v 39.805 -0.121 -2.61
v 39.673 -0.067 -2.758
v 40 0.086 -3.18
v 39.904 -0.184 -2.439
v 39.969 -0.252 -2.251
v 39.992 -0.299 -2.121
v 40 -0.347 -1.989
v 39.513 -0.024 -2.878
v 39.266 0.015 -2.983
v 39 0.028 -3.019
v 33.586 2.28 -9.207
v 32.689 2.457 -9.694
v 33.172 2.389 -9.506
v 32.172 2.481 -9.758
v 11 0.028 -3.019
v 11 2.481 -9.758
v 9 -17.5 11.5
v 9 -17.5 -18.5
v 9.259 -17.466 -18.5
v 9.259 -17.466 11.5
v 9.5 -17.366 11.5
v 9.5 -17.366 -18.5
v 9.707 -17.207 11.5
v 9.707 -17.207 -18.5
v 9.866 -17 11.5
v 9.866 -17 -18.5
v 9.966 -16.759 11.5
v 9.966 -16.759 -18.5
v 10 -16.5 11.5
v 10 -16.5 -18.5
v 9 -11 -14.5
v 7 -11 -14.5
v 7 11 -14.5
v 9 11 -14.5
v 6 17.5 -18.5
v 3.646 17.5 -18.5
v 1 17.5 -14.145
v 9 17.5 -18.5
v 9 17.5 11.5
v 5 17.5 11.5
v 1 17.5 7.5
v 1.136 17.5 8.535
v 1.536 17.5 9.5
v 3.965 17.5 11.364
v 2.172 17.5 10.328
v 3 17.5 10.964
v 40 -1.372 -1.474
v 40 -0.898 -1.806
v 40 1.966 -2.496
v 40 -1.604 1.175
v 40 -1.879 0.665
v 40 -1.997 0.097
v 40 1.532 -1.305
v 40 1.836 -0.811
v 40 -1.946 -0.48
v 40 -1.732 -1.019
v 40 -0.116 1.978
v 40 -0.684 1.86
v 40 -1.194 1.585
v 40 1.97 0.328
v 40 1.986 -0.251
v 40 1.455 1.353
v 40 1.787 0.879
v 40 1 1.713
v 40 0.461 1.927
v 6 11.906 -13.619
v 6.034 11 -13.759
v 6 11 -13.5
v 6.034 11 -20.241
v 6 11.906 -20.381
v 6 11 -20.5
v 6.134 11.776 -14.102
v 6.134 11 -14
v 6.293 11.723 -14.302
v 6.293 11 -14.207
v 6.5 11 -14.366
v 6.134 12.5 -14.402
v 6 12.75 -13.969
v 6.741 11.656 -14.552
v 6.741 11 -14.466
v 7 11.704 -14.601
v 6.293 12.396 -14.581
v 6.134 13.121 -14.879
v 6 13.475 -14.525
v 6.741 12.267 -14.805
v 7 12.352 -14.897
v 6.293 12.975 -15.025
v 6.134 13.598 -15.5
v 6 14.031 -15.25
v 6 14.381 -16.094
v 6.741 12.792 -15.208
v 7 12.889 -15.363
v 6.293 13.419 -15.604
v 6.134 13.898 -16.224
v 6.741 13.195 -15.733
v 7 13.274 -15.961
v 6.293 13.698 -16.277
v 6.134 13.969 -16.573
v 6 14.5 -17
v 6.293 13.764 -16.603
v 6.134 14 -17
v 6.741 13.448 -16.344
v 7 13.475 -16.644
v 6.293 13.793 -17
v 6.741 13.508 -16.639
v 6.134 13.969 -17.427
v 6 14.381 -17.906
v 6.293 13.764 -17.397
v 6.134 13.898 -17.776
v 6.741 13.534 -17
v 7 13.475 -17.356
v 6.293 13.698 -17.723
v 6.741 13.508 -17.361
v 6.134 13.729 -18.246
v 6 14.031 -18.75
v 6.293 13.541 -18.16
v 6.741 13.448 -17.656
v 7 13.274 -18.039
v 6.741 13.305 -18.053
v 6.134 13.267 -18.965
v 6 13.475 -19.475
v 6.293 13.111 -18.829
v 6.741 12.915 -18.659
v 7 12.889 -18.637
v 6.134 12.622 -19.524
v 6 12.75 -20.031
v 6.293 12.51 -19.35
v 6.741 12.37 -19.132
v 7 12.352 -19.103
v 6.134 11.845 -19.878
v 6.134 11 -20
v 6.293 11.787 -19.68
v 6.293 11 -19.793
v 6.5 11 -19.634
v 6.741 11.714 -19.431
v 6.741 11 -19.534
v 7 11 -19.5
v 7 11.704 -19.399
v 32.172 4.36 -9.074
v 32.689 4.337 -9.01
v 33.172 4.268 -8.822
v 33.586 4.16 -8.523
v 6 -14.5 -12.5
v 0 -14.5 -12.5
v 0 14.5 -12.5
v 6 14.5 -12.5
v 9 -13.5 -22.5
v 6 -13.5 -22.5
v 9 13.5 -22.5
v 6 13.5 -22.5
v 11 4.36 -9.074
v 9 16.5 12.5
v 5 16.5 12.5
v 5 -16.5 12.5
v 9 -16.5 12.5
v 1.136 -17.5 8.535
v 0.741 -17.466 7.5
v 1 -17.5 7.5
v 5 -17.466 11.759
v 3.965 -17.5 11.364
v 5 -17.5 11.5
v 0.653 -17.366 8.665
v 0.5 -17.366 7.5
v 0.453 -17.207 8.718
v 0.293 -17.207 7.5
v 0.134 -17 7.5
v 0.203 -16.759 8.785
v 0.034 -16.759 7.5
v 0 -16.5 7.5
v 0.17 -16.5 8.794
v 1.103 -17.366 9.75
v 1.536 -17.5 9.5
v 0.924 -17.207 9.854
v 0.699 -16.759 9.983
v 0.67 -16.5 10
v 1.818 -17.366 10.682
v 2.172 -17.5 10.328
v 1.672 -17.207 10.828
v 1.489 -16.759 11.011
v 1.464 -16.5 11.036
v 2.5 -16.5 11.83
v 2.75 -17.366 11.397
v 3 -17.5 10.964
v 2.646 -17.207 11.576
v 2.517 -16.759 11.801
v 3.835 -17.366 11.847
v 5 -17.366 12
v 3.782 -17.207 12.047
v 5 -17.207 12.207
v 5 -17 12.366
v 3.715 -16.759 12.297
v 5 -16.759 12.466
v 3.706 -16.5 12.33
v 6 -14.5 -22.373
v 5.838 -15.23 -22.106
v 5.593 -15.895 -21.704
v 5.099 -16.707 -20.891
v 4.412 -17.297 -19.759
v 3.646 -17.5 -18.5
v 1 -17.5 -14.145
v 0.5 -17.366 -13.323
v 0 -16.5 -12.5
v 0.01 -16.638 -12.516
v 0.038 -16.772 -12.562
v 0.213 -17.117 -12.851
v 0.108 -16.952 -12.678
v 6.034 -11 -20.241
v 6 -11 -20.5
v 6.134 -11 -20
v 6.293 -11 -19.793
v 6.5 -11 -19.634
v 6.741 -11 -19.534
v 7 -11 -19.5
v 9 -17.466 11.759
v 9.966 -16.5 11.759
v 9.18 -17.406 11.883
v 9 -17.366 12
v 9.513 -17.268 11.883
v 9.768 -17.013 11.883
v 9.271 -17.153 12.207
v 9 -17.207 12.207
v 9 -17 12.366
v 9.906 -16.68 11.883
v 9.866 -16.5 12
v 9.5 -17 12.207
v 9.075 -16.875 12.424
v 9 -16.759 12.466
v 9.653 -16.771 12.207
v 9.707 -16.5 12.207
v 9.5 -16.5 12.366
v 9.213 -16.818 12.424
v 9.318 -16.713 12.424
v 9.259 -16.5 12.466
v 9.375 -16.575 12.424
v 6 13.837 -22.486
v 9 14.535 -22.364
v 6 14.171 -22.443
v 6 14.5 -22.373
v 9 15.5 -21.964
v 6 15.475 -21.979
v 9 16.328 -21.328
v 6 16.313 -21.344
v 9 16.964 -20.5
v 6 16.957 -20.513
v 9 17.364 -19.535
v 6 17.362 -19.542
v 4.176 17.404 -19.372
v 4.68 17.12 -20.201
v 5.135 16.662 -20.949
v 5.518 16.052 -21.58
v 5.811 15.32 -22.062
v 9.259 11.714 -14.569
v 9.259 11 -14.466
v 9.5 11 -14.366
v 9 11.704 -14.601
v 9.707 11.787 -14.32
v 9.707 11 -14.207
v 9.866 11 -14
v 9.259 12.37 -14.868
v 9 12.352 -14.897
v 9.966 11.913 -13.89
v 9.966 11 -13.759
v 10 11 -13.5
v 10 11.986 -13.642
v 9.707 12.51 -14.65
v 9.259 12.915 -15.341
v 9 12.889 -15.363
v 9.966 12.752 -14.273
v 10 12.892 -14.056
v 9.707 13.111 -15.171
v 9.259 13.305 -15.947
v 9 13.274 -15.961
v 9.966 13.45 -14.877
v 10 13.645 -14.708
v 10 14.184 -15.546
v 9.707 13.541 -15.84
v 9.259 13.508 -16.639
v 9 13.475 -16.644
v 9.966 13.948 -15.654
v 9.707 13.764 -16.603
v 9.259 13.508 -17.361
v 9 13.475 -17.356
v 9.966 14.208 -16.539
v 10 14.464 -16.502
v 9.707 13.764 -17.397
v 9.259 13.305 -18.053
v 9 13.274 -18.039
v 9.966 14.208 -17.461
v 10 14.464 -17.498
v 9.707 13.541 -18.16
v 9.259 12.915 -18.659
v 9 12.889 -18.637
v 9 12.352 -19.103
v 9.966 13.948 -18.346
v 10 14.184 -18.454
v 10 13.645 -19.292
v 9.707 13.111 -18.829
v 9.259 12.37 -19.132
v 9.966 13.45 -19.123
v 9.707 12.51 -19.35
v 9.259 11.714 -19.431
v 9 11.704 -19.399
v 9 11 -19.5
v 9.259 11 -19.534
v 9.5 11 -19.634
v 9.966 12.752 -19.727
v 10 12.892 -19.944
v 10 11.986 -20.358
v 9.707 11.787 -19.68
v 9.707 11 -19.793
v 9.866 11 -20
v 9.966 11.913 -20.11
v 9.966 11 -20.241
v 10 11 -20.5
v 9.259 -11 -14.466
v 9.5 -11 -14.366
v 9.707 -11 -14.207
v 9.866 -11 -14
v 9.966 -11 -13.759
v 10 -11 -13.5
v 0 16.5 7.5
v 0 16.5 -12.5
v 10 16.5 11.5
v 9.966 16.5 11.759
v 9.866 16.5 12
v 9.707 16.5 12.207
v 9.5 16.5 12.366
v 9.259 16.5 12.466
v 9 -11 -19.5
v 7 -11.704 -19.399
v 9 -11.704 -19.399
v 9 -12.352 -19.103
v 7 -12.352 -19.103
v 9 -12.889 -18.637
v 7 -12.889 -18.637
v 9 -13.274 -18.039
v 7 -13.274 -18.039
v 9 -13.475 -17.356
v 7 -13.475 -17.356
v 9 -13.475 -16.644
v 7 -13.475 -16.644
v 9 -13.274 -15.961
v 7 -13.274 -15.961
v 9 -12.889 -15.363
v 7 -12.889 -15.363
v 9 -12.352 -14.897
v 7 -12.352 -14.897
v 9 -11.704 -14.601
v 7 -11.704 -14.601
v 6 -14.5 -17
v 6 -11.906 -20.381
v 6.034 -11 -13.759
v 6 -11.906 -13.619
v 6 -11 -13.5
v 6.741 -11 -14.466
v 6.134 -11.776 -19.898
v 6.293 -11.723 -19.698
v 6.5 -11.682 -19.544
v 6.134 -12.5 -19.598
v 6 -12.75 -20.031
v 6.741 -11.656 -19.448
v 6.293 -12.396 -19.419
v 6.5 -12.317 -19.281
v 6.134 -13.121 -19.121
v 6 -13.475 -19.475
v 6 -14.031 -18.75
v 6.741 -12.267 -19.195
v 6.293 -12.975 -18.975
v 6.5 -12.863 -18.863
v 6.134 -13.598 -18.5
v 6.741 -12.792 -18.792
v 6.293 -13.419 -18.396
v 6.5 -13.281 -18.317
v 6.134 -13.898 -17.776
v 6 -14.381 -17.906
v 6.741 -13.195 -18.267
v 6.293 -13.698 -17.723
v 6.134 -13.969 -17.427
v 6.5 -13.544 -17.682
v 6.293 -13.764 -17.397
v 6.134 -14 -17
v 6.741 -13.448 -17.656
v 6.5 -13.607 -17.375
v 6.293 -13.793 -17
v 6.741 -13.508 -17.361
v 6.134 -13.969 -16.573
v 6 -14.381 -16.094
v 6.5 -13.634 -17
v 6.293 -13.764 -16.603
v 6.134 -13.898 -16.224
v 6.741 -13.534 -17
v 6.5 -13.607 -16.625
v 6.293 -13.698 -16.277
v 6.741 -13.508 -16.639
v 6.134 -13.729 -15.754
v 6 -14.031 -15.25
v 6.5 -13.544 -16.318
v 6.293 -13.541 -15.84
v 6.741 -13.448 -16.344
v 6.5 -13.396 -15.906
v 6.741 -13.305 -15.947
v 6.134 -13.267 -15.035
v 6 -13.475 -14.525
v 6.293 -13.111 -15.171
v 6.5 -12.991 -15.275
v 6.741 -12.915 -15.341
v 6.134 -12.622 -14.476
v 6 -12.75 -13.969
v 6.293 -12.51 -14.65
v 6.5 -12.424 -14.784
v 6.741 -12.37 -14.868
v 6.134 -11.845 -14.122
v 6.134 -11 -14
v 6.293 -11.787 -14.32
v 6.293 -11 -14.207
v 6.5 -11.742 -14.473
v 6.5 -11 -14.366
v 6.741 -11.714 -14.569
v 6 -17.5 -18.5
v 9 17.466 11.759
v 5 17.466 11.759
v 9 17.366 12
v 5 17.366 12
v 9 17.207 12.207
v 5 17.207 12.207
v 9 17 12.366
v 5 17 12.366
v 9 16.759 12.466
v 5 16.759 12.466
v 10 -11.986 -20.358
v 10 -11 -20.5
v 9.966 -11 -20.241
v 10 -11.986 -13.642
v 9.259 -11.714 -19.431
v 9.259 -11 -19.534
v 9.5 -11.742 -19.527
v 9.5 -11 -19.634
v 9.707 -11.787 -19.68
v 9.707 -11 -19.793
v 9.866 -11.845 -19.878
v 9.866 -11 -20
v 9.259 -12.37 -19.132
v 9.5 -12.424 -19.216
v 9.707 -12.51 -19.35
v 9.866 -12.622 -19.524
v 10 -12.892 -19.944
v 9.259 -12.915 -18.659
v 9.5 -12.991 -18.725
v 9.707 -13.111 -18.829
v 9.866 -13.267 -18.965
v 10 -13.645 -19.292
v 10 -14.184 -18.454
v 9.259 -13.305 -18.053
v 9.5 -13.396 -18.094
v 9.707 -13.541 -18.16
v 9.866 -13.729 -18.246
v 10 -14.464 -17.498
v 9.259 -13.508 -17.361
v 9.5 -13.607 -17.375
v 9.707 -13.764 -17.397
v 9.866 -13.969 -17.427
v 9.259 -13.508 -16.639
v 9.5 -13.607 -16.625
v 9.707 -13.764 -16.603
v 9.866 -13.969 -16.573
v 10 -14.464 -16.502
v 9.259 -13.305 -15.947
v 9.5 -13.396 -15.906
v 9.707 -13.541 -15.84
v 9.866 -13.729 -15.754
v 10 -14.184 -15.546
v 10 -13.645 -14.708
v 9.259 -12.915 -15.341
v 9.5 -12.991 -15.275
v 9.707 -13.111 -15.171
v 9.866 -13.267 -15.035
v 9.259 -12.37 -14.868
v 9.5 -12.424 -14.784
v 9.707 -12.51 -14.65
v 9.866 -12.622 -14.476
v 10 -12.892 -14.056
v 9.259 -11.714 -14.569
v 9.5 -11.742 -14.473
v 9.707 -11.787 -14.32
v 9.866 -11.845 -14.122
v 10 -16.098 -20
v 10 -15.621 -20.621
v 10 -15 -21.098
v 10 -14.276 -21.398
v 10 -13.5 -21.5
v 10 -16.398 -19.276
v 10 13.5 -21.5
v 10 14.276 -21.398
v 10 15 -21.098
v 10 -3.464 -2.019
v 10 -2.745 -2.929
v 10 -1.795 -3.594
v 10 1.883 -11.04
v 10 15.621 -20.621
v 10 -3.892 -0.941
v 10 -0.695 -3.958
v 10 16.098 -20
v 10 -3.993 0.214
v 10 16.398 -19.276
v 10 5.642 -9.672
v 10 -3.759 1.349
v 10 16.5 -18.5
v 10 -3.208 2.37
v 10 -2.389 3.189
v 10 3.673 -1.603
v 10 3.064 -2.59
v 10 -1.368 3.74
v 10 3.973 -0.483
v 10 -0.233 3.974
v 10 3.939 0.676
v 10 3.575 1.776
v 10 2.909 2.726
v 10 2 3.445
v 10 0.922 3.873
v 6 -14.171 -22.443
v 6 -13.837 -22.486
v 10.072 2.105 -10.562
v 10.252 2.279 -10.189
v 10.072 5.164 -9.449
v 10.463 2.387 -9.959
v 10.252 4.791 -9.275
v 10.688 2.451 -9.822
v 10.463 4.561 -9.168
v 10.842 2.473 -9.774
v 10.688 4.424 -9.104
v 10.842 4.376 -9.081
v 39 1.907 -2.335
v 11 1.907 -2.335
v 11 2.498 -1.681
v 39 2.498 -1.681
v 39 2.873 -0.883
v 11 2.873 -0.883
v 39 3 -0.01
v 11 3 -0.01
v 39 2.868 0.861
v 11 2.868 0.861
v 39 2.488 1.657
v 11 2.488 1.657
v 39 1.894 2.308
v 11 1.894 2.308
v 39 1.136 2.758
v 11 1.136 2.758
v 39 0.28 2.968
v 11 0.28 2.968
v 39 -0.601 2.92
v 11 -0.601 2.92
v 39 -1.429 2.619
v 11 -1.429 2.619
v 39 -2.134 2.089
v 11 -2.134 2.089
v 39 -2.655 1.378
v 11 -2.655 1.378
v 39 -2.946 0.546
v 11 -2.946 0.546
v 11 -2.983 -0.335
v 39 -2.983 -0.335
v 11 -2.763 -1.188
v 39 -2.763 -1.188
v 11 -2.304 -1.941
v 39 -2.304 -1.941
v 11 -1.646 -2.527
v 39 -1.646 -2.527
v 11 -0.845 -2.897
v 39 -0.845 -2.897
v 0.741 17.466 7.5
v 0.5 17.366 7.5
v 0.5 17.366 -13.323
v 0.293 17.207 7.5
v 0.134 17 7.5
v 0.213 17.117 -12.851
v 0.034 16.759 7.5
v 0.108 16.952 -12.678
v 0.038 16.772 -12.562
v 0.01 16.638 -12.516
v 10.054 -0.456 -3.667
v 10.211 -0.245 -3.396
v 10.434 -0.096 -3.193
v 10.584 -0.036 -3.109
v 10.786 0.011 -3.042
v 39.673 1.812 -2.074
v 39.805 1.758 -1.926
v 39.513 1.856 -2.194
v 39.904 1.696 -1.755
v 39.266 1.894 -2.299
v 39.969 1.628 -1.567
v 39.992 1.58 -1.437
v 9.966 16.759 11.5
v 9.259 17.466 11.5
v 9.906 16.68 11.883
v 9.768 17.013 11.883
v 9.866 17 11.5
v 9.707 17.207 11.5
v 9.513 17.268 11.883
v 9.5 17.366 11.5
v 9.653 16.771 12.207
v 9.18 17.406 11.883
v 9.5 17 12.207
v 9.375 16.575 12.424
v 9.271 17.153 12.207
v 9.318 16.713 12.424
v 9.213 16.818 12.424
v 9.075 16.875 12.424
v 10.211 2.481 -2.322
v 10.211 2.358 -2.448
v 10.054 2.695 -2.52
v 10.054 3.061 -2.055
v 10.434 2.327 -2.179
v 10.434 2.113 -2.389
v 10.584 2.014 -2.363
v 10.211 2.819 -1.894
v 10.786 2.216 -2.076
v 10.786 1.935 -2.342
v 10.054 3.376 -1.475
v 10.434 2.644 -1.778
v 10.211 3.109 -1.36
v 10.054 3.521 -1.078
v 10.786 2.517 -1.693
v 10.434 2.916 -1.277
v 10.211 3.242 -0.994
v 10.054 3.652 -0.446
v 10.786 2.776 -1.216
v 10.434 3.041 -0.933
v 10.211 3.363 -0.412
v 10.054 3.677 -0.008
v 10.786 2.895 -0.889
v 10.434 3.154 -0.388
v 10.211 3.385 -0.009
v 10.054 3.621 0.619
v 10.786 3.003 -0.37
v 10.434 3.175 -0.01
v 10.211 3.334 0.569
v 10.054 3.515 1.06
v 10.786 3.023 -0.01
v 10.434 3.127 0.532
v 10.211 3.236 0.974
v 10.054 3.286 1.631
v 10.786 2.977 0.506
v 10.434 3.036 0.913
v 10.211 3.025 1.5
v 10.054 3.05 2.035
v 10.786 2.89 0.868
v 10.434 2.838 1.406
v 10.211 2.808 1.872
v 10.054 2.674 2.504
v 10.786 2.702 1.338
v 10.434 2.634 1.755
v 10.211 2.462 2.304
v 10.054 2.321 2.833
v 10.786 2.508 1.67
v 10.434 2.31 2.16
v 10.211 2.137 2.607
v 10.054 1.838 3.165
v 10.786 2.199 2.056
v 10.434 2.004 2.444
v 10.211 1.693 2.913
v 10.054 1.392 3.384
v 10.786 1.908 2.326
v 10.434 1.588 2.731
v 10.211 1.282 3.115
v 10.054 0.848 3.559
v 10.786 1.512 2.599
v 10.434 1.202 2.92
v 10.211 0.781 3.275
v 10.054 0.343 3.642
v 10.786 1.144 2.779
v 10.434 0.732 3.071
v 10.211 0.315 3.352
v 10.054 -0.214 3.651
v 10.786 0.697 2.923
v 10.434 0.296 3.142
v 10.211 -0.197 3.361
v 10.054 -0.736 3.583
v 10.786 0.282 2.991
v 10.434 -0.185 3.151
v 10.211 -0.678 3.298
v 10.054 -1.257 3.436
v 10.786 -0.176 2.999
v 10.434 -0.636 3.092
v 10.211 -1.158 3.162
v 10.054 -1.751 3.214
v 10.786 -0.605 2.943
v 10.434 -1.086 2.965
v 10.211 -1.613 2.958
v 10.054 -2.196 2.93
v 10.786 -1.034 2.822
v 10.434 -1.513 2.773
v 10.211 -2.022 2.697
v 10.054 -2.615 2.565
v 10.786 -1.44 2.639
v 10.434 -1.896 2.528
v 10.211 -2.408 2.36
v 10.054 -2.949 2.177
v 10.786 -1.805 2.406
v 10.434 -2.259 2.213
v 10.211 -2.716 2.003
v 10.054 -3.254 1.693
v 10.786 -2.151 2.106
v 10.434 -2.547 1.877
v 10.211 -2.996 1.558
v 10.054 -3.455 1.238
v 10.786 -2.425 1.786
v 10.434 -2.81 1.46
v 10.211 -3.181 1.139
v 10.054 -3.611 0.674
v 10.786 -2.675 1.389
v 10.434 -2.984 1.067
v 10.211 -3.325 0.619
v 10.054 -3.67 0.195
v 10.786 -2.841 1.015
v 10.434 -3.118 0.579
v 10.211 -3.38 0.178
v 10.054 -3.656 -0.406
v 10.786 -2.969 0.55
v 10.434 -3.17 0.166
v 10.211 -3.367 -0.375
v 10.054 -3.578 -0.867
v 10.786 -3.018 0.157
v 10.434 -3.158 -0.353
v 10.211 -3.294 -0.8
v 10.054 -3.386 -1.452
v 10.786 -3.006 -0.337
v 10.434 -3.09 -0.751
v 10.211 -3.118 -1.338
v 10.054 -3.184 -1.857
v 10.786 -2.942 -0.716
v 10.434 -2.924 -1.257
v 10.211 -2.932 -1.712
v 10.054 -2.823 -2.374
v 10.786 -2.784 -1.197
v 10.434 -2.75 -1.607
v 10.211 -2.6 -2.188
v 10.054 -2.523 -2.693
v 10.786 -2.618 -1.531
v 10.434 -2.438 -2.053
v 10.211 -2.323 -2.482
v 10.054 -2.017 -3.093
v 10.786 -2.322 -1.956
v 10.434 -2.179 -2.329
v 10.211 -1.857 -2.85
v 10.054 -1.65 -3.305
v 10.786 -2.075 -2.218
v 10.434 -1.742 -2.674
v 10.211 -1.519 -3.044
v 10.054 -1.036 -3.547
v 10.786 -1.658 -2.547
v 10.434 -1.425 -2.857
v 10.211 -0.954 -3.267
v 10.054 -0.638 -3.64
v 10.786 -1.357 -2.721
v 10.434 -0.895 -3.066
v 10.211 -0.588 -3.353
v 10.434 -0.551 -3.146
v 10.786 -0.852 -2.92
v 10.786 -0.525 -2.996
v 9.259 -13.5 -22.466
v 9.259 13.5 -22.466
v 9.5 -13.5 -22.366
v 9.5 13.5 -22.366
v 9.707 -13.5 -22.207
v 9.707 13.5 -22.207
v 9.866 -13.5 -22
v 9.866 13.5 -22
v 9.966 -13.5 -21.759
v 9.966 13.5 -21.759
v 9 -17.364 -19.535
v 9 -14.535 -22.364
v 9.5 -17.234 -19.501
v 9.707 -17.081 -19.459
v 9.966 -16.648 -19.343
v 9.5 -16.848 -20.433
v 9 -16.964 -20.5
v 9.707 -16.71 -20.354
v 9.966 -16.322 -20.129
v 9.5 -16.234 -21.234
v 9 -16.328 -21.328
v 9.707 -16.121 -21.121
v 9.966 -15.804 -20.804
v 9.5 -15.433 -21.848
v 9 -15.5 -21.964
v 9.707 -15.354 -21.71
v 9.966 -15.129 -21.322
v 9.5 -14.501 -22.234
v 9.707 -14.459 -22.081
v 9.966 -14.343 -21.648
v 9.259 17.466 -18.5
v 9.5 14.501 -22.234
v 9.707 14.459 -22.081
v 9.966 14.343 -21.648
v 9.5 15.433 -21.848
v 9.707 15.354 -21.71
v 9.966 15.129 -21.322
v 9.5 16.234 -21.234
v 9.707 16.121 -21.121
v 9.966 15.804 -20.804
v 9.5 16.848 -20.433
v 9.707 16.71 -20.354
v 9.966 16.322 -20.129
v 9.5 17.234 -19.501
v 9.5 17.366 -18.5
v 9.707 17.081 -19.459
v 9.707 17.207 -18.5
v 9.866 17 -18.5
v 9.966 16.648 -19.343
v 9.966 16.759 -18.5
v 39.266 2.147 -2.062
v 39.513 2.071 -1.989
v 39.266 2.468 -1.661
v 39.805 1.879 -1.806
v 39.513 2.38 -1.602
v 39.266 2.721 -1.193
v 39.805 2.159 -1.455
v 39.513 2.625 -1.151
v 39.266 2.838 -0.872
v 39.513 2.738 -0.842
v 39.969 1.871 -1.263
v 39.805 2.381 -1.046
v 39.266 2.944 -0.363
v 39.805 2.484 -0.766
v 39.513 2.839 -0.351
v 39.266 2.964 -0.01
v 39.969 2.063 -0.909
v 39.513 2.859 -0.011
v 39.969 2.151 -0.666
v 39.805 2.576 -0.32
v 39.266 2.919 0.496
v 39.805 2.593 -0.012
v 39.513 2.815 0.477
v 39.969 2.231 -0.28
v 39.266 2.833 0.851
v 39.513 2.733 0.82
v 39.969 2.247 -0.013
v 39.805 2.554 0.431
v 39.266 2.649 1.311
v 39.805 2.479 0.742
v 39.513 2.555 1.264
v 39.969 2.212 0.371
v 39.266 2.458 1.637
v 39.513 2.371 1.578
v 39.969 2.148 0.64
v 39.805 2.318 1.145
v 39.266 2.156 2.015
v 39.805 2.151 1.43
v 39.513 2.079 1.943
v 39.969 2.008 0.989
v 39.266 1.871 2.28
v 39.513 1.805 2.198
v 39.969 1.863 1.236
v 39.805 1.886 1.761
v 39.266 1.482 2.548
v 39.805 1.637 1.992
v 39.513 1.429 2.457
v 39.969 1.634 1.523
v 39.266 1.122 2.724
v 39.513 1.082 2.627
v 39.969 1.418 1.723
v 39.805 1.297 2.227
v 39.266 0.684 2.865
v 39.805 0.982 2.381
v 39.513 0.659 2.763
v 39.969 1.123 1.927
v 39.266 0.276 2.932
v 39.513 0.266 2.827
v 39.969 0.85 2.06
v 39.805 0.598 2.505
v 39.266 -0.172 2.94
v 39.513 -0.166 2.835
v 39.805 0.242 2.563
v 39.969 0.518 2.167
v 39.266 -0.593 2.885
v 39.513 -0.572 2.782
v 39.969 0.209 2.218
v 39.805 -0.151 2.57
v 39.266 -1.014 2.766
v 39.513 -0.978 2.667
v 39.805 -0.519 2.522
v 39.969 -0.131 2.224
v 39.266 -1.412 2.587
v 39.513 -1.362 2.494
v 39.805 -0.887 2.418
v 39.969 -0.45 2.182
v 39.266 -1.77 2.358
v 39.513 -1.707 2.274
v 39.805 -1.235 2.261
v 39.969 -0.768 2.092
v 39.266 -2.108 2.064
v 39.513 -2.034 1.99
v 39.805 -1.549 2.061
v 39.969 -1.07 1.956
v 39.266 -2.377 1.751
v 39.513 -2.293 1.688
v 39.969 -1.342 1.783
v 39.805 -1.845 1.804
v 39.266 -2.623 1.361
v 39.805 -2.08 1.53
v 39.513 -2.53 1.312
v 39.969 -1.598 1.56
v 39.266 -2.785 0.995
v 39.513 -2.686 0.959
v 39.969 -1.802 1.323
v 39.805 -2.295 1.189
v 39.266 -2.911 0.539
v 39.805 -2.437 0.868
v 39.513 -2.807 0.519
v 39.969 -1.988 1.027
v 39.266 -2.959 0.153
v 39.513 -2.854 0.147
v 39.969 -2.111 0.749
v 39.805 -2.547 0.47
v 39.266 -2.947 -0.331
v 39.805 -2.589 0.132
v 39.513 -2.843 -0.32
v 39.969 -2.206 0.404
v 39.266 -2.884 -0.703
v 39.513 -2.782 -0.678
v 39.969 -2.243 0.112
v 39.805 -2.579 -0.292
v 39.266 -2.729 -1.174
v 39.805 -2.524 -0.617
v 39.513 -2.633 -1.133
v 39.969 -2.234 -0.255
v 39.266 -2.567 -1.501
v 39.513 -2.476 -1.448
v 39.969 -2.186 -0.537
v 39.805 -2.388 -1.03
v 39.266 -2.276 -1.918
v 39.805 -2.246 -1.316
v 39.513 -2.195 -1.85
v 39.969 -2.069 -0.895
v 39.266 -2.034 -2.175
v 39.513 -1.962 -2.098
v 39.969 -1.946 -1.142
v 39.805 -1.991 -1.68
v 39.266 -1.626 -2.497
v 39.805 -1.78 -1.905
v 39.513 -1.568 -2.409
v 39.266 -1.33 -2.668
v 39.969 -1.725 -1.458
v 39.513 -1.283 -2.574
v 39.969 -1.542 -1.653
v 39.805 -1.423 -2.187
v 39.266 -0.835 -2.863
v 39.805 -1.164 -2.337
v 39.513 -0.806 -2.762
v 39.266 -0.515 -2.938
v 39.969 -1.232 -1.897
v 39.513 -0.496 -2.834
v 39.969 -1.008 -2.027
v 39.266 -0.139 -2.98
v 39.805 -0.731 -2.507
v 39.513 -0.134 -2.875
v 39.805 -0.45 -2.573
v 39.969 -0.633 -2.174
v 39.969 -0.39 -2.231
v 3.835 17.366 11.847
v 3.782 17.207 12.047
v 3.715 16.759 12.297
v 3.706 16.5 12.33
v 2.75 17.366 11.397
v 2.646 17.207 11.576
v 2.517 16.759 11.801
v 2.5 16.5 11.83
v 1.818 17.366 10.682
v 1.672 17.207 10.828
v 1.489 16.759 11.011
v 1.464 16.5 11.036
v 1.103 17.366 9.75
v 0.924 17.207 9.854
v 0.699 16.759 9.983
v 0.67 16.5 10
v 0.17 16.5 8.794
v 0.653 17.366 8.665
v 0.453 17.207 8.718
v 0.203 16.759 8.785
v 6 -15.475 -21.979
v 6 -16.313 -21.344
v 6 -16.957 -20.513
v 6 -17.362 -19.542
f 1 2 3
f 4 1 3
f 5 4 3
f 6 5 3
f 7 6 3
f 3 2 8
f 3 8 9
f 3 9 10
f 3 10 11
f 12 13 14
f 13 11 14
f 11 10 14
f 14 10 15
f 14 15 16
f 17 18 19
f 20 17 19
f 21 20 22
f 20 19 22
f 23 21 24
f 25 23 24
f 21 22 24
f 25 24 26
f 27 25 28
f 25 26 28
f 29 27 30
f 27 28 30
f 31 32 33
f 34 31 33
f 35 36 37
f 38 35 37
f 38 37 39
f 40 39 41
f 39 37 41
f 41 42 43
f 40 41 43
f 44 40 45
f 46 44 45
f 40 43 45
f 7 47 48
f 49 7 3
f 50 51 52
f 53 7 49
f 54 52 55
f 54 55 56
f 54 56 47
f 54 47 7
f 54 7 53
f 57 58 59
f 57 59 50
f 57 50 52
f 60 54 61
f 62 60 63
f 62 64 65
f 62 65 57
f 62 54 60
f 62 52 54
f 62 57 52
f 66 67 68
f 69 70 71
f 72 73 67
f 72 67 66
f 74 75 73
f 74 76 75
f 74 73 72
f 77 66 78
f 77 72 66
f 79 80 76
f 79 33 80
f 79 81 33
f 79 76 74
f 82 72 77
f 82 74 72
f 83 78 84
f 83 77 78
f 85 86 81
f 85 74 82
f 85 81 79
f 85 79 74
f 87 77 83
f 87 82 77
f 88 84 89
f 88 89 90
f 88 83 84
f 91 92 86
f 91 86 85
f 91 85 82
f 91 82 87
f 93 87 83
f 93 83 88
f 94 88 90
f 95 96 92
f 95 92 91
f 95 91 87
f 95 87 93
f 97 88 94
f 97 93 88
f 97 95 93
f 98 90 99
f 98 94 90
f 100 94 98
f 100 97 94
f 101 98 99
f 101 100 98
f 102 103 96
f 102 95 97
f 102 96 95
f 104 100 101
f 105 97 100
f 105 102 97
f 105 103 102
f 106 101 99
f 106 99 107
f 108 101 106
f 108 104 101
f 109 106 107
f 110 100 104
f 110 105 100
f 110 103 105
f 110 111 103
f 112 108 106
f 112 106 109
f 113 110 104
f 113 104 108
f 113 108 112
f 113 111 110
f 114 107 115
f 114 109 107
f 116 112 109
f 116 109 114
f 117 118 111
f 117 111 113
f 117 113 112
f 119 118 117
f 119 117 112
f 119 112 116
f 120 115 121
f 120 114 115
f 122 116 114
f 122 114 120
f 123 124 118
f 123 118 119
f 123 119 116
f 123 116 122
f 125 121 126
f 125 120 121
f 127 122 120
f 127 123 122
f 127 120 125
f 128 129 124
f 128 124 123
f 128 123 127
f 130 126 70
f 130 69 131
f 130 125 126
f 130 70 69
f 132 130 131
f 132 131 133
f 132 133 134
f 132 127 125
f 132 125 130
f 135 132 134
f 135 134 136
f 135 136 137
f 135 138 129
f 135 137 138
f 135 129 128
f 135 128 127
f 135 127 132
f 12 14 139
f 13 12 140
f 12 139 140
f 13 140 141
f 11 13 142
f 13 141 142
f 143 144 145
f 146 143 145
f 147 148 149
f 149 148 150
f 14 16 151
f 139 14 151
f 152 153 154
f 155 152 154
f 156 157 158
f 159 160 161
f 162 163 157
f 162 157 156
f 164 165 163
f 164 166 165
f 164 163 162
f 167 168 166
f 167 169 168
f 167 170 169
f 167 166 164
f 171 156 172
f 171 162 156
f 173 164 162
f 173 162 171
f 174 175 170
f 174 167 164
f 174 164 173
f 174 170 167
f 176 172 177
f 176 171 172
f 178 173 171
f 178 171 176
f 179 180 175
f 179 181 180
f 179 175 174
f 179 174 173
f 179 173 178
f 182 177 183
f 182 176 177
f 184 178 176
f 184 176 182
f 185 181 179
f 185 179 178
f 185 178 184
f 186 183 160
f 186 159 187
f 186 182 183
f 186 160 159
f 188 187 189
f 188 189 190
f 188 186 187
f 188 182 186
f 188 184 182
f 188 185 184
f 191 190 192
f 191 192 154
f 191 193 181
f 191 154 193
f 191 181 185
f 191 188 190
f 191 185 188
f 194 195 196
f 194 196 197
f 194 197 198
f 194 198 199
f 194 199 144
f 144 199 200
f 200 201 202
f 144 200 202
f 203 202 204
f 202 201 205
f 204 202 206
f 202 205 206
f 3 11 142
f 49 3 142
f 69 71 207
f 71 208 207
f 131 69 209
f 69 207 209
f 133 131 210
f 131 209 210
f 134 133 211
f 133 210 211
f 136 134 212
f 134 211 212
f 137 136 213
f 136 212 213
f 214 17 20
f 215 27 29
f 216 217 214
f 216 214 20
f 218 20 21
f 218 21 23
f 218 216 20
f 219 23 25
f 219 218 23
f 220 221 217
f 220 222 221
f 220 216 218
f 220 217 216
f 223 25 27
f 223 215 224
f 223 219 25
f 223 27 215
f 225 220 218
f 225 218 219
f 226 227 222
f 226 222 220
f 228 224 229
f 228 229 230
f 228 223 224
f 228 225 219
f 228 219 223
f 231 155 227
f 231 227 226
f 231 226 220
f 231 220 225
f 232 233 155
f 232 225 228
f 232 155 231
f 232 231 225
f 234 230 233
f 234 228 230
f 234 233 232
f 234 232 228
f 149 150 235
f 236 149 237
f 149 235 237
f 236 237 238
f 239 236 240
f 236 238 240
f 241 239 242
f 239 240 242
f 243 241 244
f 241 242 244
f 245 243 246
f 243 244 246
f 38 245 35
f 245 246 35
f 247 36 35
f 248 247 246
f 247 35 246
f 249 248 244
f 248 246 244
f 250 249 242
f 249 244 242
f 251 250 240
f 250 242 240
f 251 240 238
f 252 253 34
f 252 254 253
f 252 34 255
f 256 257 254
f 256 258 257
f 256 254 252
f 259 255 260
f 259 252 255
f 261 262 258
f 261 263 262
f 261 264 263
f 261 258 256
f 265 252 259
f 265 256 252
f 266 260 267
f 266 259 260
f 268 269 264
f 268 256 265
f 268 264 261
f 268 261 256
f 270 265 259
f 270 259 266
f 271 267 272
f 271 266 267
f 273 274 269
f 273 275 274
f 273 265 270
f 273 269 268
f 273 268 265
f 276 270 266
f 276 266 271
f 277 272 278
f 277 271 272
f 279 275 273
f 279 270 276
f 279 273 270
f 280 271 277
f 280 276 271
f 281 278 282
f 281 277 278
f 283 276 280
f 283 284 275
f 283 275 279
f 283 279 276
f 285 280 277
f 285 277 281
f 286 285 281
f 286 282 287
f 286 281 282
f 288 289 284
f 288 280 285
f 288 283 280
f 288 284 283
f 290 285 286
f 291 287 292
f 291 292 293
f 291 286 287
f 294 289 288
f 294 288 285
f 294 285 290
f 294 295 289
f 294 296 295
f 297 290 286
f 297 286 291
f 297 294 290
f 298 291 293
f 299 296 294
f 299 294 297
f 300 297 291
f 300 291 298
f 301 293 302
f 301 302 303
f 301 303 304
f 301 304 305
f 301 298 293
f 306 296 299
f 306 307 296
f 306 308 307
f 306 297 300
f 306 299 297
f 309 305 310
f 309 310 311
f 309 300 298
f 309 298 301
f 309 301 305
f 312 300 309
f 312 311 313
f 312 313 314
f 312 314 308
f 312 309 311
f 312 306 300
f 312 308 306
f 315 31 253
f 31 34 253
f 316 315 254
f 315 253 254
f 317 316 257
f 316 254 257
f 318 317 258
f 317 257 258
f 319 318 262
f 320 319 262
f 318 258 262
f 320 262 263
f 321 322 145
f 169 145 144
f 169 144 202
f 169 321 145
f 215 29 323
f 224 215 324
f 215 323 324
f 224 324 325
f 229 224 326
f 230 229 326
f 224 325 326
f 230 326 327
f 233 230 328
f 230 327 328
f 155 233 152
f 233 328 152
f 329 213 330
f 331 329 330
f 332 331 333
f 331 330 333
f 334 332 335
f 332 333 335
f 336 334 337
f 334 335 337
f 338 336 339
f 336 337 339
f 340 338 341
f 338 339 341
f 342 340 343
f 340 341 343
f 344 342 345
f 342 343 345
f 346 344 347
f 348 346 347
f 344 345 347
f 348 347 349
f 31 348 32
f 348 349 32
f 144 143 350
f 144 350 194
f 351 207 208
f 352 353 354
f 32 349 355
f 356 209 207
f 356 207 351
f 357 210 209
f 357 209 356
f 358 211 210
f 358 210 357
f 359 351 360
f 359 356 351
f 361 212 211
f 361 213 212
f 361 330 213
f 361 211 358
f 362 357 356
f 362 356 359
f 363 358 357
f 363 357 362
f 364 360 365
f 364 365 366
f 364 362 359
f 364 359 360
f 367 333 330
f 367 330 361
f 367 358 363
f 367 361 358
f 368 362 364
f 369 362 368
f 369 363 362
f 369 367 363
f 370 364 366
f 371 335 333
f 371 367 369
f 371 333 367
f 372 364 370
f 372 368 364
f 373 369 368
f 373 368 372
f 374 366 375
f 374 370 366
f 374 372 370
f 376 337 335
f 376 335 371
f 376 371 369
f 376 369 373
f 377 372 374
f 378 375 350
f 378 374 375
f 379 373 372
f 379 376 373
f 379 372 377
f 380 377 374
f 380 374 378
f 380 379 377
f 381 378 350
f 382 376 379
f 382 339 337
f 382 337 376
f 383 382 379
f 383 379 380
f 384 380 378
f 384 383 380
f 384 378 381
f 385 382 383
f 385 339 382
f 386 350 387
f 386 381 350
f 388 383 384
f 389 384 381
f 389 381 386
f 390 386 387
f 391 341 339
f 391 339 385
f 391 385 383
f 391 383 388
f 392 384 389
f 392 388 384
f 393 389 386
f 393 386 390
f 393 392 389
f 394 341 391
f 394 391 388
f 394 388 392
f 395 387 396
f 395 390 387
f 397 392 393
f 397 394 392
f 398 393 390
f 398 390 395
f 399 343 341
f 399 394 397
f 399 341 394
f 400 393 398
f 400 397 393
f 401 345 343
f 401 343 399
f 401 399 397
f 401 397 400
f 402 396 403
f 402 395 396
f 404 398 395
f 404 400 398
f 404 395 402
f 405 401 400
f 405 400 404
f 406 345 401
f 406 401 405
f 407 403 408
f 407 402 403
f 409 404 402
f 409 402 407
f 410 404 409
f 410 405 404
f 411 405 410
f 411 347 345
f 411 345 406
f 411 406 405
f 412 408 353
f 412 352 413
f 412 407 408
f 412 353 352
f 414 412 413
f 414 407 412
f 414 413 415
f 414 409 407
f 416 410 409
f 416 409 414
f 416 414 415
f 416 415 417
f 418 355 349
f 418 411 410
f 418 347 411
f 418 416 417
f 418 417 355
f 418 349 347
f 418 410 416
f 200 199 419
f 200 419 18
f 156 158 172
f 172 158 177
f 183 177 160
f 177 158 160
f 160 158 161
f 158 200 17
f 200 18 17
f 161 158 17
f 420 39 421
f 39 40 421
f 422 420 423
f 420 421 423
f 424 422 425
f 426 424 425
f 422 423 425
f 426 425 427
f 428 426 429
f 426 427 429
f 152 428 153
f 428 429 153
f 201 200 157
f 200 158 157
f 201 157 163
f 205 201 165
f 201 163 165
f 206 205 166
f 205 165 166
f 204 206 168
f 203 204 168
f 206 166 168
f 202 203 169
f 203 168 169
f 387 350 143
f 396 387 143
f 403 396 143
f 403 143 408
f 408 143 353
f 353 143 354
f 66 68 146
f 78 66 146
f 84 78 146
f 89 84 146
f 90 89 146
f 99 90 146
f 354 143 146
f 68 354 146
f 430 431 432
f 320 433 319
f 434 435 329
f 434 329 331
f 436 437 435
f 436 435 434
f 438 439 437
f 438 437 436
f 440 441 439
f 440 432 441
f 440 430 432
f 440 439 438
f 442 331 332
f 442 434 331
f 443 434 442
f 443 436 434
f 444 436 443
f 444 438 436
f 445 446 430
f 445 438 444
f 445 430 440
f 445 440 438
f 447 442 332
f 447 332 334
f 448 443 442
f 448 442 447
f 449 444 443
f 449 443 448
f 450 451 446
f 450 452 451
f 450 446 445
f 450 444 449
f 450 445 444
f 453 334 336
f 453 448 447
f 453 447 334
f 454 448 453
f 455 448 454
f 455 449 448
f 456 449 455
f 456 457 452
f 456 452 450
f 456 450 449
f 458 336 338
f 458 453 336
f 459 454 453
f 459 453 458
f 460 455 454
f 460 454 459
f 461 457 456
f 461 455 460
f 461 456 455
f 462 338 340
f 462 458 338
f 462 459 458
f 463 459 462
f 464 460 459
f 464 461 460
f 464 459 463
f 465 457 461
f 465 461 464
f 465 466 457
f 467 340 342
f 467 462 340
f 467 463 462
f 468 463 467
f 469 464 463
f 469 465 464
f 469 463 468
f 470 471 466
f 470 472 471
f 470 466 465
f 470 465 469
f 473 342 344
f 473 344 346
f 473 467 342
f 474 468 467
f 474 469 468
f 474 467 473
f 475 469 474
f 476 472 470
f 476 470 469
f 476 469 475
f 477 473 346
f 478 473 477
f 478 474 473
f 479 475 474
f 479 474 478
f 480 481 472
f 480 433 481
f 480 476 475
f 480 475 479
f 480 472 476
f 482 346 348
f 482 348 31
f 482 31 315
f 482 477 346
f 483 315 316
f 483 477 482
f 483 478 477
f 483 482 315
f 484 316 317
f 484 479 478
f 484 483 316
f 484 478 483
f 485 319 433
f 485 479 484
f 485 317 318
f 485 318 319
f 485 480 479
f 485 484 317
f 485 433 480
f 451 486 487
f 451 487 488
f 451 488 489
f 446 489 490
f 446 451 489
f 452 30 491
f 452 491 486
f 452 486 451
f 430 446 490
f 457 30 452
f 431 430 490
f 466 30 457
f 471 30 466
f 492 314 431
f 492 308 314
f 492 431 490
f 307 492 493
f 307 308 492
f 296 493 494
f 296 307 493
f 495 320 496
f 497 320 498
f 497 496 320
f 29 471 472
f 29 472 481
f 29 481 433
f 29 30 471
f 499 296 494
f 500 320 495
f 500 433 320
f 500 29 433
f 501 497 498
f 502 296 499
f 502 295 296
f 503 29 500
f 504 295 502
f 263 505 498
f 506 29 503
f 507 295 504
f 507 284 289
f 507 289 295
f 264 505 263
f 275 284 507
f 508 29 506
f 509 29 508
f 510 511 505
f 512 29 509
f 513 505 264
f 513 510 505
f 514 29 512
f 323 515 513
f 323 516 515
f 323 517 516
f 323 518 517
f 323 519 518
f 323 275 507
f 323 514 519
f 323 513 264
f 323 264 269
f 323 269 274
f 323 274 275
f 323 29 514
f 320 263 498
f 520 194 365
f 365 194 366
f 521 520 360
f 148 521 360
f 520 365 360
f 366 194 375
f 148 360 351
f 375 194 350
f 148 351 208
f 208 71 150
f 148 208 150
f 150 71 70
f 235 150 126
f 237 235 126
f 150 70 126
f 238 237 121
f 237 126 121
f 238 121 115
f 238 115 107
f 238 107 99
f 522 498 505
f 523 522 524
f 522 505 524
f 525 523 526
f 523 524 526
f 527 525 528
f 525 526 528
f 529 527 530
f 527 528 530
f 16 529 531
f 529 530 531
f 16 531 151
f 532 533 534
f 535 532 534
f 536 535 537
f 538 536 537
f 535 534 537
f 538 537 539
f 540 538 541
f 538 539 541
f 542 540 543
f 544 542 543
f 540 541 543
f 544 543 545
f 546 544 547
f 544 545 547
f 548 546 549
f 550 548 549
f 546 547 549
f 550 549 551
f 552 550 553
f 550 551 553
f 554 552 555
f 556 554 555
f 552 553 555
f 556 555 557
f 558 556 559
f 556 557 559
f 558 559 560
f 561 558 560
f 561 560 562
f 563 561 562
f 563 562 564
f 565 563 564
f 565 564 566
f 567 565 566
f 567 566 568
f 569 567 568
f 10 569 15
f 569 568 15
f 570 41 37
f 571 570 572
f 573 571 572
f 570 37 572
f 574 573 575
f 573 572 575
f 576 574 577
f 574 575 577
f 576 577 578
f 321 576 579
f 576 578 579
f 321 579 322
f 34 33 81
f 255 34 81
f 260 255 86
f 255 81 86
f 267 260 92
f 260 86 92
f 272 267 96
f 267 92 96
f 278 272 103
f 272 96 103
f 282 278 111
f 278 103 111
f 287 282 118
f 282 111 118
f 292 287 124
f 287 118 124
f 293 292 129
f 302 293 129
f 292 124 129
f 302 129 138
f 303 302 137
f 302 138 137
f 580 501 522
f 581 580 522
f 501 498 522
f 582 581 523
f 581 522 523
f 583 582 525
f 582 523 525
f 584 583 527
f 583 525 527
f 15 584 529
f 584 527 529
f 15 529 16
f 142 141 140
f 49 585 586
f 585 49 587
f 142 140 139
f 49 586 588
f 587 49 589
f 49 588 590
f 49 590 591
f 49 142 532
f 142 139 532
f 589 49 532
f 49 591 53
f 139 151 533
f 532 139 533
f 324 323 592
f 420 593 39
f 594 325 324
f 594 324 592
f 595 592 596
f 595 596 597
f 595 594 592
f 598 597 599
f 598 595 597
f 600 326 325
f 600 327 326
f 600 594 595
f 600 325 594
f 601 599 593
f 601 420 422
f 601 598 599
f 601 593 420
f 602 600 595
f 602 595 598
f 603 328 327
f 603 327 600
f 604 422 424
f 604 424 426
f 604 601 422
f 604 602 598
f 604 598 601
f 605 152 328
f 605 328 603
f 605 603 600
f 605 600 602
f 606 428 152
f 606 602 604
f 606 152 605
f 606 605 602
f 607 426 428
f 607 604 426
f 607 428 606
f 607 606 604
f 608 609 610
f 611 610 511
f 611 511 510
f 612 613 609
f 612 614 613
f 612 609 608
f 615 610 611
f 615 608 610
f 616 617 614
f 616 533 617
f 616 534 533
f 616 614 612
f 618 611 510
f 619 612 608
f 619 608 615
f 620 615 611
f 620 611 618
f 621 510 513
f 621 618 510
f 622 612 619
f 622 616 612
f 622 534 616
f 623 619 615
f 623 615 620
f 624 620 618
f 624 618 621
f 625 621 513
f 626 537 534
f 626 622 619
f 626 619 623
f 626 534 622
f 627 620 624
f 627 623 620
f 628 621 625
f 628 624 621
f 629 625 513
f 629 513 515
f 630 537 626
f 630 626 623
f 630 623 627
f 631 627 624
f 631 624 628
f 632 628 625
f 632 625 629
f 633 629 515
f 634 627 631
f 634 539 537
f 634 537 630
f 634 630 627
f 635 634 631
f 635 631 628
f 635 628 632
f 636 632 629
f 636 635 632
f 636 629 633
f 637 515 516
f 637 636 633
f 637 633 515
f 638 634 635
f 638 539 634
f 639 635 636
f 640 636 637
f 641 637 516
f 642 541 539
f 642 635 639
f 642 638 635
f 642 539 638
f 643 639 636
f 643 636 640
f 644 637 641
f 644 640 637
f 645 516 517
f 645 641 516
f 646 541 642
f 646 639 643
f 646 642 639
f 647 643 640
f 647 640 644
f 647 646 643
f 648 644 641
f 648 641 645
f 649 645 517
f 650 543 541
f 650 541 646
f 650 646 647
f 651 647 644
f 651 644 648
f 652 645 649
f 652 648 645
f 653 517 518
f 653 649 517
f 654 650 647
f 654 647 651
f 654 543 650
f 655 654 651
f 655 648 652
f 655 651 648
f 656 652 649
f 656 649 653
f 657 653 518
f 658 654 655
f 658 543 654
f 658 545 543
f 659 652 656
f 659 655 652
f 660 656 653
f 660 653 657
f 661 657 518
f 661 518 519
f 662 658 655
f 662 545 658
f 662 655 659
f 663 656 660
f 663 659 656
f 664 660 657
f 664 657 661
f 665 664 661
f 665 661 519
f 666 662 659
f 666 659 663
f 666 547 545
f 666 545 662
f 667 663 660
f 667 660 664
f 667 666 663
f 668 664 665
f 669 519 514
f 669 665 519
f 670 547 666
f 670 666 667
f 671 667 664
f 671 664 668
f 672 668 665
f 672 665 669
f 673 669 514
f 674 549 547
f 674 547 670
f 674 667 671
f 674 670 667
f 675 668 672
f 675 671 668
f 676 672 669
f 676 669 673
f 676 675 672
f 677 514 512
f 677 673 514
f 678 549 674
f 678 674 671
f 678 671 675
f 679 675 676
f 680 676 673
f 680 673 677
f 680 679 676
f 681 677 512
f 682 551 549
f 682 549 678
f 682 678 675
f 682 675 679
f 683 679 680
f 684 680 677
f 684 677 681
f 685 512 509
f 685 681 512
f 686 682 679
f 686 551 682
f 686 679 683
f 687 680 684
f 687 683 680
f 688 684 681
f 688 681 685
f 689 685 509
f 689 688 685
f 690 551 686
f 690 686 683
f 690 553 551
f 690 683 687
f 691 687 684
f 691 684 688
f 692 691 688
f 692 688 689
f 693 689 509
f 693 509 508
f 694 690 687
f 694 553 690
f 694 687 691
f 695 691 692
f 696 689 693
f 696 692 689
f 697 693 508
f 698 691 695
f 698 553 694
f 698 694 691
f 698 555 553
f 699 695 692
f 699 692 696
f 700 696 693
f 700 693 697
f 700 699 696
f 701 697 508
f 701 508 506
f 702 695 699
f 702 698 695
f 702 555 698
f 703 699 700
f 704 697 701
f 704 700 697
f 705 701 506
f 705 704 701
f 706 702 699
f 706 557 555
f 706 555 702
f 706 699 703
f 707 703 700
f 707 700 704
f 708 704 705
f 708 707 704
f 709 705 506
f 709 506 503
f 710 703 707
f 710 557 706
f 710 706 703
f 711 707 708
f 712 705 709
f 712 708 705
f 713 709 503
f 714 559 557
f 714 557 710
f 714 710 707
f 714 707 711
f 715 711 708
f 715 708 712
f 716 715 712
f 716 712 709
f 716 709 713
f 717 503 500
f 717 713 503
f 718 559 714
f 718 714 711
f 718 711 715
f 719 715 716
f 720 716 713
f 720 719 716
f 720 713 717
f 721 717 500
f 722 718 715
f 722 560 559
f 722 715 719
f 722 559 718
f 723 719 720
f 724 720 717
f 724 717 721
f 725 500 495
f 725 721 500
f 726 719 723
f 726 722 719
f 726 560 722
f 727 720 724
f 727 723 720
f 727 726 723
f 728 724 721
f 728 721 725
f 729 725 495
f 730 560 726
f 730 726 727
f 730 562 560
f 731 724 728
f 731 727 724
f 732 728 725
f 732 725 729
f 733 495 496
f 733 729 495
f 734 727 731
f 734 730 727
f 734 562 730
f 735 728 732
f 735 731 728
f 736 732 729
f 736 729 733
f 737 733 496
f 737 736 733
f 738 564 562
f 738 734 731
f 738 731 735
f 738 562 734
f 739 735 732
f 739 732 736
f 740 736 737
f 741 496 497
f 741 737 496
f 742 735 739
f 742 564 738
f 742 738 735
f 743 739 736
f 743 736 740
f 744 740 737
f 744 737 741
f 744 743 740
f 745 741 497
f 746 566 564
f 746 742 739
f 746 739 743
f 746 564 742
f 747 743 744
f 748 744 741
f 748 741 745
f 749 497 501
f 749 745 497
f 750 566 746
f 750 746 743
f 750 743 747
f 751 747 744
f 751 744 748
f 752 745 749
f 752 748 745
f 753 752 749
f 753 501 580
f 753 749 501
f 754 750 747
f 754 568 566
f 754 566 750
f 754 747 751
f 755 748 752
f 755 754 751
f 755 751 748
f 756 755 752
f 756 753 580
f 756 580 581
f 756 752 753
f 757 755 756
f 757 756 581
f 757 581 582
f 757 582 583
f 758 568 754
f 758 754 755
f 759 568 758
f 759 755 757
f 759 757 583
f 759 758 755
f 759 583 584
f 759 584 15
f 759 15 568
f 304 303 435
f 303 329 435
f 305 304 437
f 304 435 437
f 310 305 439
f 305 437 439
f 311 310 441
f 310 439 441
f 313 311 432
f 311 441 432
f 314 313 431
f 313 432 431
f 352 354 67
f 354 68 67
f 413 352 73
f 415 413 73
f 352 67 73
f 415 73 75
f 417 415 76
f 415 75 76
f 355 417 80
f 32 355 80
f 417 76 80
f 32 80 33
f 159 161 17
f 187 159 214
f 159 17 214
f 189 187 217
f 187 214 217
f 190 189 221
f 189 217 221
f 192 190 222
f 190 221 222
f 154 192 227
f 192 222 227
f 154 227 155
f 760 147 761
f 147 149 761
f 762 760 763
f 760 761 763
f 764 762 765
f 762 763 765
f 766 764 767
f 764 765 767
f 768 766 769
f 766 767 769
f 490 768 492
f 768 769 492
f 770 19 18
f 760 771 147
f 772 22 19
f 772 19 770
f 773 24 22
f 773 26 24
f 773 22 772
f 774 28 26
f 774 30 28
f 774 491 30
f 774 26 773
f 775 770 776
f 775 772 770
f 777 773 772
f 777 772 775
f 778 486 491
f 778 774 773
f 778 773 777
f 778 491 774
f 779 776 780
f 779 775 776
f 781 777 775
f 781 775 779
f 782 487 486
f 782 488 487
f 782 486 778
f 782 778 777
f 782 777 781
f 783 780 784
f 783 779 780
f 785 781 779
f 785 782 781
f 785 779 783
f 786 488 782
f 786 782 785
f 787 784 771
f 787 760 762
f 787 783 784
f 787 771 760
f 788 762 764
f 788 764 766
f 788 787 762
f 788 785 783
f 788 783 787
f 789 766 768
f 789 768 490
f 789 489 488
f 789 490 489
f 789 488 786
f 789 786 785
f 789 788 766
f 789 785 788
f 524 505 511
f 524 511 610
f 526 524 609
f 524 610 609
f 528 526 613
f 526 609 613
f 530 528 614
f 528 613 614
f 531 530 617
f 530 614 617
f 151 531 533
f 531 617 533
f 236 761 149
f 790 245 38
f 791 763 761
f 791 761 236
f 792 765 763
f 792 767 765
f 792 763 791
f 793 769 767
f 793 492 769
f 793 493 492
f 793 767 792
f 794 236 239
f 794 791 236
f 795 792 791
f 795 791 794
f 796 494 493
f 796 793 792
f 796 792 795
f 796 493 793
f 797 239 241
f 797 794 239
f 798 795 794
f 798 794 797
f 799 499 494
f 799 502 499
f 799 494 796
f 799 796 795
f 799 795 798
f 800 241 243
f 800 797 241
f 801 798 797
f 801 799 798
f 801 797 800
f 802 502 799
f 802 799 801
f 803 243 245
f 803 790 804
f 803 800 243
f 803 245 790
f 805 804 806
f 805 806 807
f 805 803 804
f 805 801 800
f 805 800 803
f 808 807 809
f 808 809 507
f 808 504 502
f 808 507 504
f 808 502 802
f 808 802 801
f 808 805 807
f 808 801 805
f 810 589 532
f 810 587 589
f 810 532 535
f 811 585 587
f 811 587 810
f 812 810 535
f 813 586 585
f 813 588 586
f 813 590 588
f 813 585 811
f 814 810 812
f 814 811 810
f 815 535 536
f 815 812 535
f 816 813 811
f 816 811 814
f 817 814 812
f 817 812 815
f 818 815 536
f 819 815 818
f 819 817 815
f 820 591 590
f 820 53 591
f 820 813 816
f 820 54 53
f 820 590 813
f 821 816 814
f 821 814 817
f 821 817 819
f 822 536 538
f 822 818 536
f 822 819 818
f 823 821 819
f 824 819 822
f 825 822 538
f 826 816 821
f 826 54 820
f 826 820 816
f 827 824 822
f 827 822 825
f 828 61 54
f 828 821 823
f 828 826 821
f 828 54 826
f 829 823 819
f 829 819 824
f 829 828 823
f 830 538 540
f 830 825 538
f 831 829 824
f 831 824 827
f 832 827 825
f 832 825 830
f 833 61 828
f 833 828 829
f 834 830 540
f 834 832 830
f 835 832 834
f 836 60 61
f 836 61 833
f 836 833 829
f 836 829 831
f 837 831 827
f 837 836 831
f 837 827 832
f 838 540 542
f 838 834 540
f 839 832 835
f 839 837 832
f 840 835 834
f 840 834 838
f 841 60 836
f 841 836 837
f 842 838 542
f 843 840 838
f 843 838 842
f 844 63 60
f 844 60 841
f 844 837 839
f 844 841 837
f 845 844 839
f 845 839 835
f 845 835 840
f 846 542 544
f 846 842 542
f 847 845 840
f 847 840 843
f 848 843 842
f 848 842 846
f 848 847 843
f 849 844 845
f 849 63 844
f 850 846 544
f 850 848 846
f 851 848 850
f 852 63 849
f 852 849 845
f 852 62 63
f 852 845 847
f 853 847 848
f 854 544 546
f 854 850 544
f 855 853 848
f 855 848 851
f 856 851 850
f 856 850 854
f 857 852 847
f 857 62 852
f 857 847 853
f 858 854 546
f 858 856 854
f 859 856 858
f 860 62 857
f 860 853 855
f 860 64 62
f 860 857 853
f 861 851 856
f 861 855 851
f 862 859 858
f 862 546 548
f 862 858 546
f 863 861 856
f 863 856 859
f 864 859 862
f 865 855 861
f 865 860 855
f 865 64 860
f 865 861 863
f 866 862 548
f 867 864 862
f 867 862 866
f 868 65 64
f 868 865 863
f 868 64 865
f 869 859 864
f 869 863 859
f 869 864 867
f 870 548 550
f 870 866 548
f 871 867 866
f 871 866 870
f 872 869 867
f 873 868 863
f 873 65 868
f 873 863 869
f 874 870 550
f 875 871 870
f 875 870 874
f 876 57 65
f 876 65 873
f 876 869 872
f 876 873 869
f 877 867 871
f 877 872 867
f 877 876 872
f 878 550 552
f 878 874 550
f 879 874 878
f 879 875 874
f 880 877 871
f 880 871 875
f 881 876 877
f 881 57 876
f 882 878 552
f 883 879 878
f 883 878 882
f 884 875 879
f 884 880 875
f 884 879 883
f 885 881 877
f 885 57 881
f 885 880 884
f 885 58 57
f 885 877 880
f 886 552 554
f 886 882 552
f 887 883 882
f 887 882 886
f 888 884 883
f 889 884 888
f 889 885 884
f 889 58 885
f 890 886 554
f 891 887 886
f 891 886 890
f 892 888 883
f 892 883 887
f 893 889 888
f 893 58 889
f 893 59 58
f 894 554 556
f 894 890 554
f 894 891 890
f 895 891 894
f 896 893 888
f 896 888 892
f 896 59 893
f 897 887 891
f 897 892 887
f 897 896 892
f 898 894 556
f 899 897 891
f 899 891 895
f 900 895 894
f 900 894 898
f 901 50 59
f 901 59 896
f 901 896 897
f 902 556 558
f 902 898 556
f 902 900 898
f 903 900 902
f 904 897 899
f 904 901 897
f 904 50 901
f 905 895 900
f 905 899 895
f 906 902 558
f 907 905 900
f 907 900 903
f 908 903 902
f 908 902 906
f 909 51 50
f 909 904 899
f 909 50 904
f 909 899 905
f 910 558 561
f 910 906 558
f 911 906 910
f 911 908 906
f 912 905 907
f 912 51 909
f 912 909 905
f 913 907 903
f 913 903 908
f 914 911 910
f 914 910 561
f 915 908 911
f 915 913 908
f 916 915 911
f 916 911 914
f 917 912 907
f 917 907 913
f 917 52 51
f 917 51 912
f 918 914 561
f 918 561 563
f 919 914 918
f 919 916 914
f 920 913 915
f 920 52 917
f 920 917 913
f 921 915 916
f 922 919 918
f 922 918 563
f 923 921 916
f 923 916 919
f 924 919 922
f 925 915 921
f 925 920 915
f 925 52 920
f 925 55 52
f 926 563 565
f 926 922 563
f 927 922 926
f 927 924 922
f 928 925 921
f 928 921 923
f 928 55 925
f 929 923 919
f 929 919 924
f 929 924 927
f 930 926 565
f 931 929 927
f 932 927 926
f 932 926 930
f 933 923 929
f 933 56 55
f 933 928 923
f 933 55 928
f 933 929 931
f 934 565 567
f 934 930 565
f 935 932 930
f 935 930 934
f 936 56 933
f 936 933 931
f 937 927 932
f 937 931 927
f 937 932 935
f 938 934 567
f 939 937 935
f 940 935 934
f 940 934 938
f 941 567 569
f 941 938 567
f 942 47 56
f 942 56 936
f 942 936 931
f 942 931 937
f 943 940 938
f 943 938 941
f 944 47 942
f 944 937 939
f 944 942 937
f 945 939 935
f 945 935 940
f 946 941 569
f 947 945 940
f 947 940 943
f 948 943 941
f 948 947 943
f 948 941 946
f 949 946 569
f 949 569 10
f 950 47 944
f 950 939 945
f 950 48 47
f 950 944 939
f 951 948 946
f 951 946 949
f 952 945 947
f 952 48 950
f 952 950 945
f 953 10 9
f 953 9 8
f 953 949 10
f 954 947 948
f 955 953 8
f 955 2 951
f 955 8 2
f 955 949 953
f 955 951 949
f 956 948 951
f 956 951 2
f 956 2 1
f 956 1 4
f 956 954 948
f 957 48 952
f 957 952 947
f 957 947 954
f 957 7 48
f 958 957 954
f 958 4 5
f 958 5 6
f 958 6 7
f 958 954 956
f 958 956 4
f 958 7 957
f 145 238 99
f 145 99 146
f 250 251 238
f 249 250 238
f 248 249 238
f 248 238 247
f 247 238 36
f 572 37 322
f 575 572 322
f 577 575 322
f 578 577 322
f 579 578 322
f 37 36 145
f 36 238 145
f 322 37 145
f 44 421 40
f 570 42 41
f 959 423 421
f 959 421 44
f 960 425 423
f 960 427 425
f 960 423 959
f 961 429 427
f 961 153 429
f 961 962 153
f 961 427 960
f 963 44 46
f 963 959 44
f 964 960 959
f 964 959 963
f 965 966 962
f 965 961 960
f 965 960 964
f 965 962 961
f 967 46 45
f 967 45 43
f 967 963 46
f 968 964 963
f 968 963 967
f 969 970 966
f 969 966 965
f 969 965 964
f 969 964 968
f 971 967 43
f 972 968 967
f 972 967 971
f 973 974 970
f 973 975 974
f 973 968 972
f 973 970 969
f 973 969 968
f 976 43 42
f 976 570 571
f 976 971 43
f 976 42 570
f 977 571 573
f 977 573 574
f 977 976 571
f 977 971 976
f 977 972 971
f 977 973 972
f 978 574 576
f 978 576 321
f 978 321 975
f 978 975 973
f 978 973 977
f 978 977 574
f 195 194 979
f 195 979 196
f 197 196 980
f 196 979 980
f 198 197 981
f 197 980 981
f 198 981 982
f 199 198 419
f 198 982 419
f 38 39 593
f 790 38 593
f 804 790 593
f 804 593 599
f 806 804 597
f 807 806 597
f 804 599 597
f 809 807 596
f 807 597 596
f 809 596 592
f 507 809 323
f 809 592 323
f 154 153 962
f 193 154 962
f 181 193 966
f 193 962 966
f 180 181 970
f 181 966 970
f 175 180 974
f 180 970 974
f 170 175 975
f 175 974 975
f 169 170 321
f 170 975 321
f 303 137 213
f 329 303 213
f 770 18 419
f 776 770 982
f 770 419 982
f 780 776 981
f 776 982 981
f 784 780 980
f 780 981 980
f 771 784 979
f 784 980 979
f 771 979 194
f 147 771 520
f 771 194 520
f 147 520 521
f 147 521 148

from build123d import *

# Parameters (mm, degrees)
F0_W      = 35
F0_H      = 25
F1_DEPTH  = 6
F3_DEPTH  = 4
F4_R      = 1
F6_DEPTH  = 6
F8_DEPTH  = 35.001
F10_DEPTH = 30
F11_SIZE  = 7
F12_R     = 2
F13_R     = 5
F14_R     = 1
F15_R     = 1


with BuildPart() as f1:
    # F0 (on Right) → F1 (new body)
    with BuildSketch(Plane.YZ):
        Rectangle(F0_W, F0_H)
    extrude(amount=F1_DEPTH)

    # F2 (on face) → F3 (join)
    with BuildSketch(Plane.YZ.offset(6)):
        with BuildLine():
            Line((17.5, 12.5), (-17.5, 12.5))
            Line((-17.5, 12.5), (-17.5, -18.5))
            ThreePointArc((-17.5, -18.5), (-16.3284271247, -21.3284271247), (-13.5, -22.5))
            Line((-13.5, -22.5), (13.5, -22.5))
            ThreePointArc((13.5, -22.5), (16.3284271247, -21.3284271247), (17.5, -18.5))
            Line((17.5, -18.5), (17.5, 12.5))
        make_face()
        with BuildLine():
            ThreePointArc((-11, -19.5), (-13.5, -17), (-11, -14.5))
            Line((-11, -14.5), (11, -14.5))
            ThreePointArc((11, -14.5), (13.5, -17), (11, -19.5))
            Line((11, -19.5), (-11, -19.5))
        make_face(mode=Mode.SUBTRACT)
    extrude(amount=F3_DEPTH)

    # F4
    f4_edges = [f1.edges().sort_by_distance(p)[0] for p in [
        (10, -16.328427, -21.328427),
        (10, 0, -19.5),
        (6, 0, -19.5),
    ]]
    fillet(f4_edges, radius=F4_R)

    # F5 (on face) → F6 (join, through all)
    with BuildSketch(Plane(origin=(6, 0, 0), x_dir=(0, -1, 0), z_dir=(-1, 0, 0))):
        with BuildLine():
            Line((17.5, -12.5), (14.5, -12.5))
            Line((14.5, -12.5), (14.5, -22.3729833462))
            ThreePointArc((14.5, -22.3729833462), (16.6622776602, -20.9494897428), (17.5, -18.5))
            Line((17.5, -18.5), (17.5, -12.5))
        make_face()
        with BuildLine():
            Line((-14.5, -12.5), (-17.5, -12.5))
            Line((-17.5, -12.5), (-17.5, -18.5))
            ThreePointArc((-17.5, -18.5), (-16.6622776602, -20.9494897428), (-14.5, -22.3729833462))
            Line((-14.5, -22.3729833462), (-14.5, -12.5))
        make_face()
    extrude(amount=F6_DEPTH)

    # F7 (on face) → F8 (cut, through all)
    with BuildSketch(Plane.XZ.offset(17.5)):
        Polygon((6, -22.3729833462), (0, -12.5), (0, -22.3729833462), align=None)
    extrude(amount=-F8_DEPTH, mode=Mode.SUBTRACT)

    # F9 (on face) → F10 (join)
    with BuildSketch(Plane.YZ.offset(10)):
        with BuildLine():
            Line((4.359894054, -9.0739122182), (1.9070716714, -2.3348381079))
            ThreePointArc((1.9070716714, -2.3348381079), (-1.02606043, 2.8000717087), (0.0276864298, -3.0188783946))
            Line((0.0276864298, -3.0188783946), (2.4805088125, -9.7579525049))
            Line((2.4805088125, -9.7579525049), (4.359894054, -9.0739122182))
        make_face()
    extrude(amount=F10_DEPTH)

    # F11
    f11_edges = [f1.edges().sort_by_distance(p)[0] for p in [
        (40, 3.420201, -9.415932),
    ]]
    chamfer(f11_edges, length=F11_SIZE)

    # F12
    f12_edges = [f1.edges().sort_by_distance(p)[0] for p in [
        (33, 3.420201, -9.415932),
    ]]
    fillet(f12_edges, radius=F12_R)

    # F13
    f13_edges = [f1.edges().sort_by_distance(p)[0] for p in [
        (0, 0, 12.5),
    ]]
    fillet(f13_edges, radius=F13_R)

    # F14
    f14_edges = [f1.edges().sort_by_distance(p)[0] for p in [
        (0, 17.5, -2.5),
    ]]
    fillet(f14_edges, radius=F14_R)

    # F15
    f15_edges = [f1.edges().sort_by_distance(p)[0] for p in [
        (10, 3.133483, -5.704375),
        (10, -1.02606, 2.800072),
        (10, 3.420201, -9.415932),
        (10, 1.254098, -6.388415),
        (40, -1.02606, 2.800072),
    ]]
    fillet(f15_edges, radius=F15_R)


solid = f1.part
